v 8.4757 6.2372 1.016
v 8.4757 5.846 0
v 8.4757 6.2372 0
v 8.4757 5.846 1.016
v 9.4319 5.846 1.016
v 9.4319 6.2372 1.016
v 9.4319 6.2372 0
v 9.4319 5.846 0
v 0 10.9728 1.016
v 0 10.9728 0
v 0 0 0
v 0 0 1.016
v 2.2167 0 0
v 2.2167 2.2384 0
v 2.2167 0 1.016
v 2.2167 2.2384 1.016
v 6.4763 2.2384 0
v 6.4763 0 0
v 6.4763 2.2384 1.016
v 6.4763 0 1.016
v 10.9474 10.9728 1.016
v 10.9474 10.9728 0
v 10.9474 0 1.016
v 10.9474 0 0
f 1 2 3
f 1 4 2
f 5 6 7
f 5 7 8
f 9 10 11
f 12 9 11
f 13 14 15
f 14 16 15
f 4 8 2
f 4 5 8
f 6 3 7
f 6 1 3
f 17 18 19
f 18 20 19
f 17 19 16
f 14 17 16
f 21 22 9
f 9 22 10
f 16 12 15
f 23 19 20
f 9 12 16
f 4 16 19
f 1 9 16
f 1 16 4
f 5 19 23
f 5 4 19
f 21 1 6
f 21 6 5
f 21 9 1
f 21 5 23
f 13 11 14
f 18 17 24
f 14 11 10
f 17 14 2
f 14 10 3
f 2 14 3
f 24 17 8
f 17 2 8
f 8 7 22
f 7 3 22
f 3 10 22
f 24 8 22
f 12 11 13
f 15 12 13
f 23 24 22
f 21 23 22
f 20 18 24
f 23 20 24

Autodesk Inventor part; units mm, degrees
ref_plane "YZ Plane" through (0, 0, 0) normal (1, 0, 0) x (0, 1, 0)
ref_plane "XZ Plane" through (0, 0, 0) normal (0, 1, 0) x (-1, 0, 0)
ref_plane "XY Plane" through (0, 0, 0) normal (0, 0, 1) x (1, 0, 0)
sketch "Sketch1" plane through (0, 0, 0) normal (0, 0, 1) x (1, 0, 0)
  point P0 (0, 0)
sketch "Sketch2" plane through (0, 0, 0) normal (0, 0, 1) x (1, 0, 0)
  line L0 (0, 0) -> (10.9474, 0)
  line L1 (10.9474, 0) -> (10.9474, 10.9728)
  line L2 (10.9474, 10.9728) -> (0, 10.9728)
  line L3 (0, 10.9728) -> (0, 0)
  dimension "d0" = 10.9474
  dimension "d1" = 10.9728
extrude "Extrusion1" add sketch "Sketch2" along normal blind 1.016
sketch "Sketch3" plane through (0, 0, 1.016) normal (0, 0, 1) x (1, 0, 0)
  line L0 (0, 0) -> (10.9474, 0) projected
  line L1 (2.2167, 0) -> (6.4763, 0)
  line L2 (6.4763, 0) -> (6.4763, 2.2384)
  line L3 (6.4763, 2.2384) -> (2.2167, 2.2384)
  line L4 (2.2167, 2.2384) -> (2.2167, 0)
  line L5 (8.5191, 6.2372) -> (9.3015, 6.2372)
  line L6 (9.3015, 6.2372) -> (9.3015, 5.7591)
  line L7 (9.3015, 5.7591) -> (8.5191, 5.7591)
  line L8 (8.5191, 5.7591) -> (8.5191, 6.2372)
extrude "Extrusion2" cut sketch "Sketch3" against normal blind 1.016 contours L4 L3 L2 L0
sketch "Sketch4" plane through (0, 0, 1.016) normal (0, 0, 1) x (1, 0, 0)
  line L0 (8.4757, 6.2372) -> (9.4319, 6.2372)
  line L1 (9.4319, 6.2372) -> (9.4319, 5.846)
  line L2 (9.4319, 5.846) -> (8.4757, 5.846)
  line L3 (8.4757, 5.846) -> (8.4757, 6.2372)
  point P0 (0, 0)
extrude "Extrusion3" cut sketch "Sketch4" against normal blind 1.016
properties part number "front"
